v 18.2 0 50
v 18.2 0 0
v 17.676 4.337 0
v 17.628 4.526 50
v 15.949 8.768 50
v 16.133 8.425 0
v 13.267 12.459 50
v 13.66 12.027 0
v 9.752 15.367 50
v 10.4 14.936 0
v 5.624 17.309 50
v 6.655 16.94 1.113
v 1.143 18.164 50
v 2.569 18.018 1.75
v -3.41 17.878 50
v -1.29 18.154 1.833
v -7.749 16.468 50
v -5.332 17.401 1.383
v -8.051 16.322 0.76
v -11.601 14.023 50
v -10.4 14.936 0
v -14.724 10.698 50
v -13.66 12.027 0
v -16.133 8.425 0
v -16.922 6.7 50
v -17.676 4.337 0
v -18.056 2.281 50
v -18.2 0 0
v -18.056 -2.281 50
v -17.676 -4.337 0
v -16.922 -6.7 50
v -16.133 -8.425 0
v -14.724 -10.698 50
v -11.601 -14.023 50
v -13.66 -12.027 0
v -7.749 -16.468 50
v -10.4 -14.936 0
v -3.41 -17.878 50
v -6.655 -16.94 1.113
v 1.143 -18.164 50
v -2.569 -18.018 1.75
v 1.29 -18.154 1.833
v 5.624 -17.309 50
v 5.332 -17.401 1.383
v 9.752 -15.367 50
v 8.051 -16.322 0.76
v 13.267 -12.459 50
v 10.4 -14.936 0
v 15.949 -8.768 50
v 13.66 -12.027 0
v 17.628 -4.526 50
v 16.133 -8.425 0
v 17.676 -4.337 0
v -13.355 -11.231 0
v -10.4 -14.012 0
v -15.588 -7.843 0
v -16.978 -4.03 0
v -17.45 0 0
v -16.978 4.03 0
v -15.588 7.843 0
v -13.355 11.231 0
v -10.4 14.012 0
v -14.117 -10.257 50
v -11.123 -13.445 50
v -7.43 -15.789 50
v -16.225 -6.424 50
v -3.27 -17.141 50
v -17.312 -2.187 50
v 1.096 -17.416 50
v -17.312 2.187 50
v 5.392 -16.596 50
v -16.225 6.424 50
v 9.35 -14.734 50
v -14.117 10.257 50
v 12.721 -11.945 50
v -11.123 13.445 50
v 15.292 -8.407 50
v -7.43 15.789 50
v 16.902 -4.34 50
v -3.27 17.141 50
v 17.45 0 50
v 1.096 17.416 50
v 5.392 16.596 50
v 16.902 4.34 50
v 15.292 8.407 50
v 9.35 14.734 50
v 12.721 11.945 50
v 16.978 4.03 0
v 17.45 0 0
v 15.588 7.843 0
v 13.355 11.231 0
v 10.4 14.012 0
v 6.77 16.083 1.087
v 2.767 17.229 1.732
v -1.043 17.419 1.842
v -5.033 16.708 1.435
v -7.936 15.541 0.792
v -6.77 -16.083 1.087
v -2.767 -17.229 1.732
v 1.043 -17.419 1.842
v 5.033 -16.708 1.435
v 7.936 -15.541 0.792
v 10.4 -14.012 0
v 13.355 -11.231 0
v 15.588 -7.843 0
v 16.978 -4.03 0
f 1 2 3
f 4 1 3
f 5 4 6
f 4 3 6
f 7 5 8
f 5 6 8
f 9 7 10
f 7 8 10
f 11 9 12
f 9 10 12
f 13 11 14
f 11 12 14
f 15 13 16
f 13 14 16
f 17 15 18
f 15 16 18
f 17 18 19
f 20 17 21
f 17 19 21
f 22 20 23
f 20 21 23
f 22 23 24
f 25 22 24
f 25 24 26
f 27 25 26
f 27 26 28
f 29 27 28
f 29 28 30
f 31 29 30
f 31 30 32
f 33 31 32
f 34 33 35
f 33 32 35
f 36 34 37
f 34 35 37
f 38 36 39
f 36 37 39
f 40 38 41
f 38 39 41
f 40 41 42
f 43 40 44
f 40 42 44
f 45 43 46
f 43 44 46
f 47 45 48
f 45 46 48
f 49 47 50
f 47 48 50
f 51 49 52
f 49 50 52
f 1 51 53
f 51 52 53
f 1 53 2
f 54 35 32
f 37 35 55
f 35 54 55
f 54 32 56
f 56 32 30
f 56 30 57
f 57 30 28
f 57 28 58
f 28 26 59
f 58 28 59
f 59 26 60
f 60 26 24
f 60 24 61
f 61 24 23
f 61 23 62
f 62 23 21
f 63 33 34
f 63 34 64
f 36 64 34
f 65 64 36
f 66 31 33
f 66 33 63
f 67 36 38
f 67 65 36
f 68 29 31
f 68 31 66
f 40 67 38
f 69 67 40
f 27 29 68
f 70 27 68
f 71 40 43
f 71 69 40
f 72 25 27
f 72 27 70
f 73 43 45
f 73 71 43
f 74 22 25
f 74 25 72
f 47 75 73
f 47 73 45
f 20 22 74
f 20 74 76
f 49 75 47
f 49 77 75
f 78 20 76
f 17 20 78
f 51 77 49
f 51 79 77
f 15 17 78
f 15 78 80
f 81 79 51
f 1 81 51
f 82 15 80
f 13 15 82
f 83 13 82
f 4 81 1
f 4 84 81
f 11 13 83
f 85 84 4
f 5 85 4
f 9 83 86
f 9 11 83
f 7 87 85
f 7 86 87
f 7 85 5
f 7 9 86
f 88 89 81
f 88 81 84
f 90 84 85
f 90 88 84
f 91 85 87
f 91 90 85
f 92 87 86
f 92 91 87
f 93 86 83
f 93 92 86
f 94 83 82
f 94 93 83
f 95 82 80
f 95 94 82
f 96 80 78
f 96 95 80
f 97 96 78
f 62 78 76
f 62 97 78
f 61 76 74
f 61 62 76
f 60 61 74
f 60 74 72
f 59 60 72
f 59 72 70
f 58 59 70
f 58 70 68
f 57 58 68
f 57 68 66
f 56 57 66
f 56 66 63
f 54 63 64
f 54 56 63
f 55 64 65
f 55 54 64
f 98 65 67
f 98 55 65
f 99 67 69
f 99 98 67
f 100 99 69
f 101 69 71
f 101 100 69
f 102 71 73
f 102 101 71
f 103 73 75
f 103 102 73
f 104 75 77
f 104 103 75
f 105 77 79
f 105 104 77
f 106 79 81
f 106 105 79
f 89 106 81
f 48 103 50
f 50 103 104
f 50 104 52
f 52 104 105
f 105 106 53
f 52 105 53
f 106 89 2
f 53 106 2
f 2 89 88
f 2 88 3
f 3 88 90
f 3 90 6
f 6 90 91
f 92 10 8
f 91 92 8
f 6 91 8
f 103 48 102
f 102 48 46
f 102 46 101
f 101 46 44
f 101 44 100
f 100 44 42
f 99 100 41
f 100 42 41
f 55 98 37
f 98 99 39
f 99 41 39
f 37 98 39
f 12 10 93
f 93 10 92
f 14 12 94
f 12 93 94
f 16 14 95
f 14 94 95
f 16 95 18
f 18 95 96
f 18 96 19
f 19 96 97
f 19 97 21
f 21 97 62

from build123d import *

# Parameters (mm, degrees)
F0_R     = 18.2
F0_R_2   = 17.45
F1_DEPTH = 50
F3_DEPTH = 95


with BuildPart() as f1:
    # F0 (on Top) → F1 (new body)
    with BuildSketch(Plane.XY):
        Circle(F0_R)
        Circle(F0_R_2, mode=Mode.SUBTRACT)
    extrude(amount=F1_DEPTH)

    # F2 (on Front) → F3 (cut, symmetric)
    with BuildSketch(Plane.XZ):
        with BuildLine():
            ThreePointArc((10.4, 0), (0, 1.860348), (-10.4, 0))
            Line((-10.4, 0), (10.4, 0))
        make_face()
    extrude(amount=F3_DEPTH, both=True, mode=Mode.SUBTRACT)


solid = f1.part
